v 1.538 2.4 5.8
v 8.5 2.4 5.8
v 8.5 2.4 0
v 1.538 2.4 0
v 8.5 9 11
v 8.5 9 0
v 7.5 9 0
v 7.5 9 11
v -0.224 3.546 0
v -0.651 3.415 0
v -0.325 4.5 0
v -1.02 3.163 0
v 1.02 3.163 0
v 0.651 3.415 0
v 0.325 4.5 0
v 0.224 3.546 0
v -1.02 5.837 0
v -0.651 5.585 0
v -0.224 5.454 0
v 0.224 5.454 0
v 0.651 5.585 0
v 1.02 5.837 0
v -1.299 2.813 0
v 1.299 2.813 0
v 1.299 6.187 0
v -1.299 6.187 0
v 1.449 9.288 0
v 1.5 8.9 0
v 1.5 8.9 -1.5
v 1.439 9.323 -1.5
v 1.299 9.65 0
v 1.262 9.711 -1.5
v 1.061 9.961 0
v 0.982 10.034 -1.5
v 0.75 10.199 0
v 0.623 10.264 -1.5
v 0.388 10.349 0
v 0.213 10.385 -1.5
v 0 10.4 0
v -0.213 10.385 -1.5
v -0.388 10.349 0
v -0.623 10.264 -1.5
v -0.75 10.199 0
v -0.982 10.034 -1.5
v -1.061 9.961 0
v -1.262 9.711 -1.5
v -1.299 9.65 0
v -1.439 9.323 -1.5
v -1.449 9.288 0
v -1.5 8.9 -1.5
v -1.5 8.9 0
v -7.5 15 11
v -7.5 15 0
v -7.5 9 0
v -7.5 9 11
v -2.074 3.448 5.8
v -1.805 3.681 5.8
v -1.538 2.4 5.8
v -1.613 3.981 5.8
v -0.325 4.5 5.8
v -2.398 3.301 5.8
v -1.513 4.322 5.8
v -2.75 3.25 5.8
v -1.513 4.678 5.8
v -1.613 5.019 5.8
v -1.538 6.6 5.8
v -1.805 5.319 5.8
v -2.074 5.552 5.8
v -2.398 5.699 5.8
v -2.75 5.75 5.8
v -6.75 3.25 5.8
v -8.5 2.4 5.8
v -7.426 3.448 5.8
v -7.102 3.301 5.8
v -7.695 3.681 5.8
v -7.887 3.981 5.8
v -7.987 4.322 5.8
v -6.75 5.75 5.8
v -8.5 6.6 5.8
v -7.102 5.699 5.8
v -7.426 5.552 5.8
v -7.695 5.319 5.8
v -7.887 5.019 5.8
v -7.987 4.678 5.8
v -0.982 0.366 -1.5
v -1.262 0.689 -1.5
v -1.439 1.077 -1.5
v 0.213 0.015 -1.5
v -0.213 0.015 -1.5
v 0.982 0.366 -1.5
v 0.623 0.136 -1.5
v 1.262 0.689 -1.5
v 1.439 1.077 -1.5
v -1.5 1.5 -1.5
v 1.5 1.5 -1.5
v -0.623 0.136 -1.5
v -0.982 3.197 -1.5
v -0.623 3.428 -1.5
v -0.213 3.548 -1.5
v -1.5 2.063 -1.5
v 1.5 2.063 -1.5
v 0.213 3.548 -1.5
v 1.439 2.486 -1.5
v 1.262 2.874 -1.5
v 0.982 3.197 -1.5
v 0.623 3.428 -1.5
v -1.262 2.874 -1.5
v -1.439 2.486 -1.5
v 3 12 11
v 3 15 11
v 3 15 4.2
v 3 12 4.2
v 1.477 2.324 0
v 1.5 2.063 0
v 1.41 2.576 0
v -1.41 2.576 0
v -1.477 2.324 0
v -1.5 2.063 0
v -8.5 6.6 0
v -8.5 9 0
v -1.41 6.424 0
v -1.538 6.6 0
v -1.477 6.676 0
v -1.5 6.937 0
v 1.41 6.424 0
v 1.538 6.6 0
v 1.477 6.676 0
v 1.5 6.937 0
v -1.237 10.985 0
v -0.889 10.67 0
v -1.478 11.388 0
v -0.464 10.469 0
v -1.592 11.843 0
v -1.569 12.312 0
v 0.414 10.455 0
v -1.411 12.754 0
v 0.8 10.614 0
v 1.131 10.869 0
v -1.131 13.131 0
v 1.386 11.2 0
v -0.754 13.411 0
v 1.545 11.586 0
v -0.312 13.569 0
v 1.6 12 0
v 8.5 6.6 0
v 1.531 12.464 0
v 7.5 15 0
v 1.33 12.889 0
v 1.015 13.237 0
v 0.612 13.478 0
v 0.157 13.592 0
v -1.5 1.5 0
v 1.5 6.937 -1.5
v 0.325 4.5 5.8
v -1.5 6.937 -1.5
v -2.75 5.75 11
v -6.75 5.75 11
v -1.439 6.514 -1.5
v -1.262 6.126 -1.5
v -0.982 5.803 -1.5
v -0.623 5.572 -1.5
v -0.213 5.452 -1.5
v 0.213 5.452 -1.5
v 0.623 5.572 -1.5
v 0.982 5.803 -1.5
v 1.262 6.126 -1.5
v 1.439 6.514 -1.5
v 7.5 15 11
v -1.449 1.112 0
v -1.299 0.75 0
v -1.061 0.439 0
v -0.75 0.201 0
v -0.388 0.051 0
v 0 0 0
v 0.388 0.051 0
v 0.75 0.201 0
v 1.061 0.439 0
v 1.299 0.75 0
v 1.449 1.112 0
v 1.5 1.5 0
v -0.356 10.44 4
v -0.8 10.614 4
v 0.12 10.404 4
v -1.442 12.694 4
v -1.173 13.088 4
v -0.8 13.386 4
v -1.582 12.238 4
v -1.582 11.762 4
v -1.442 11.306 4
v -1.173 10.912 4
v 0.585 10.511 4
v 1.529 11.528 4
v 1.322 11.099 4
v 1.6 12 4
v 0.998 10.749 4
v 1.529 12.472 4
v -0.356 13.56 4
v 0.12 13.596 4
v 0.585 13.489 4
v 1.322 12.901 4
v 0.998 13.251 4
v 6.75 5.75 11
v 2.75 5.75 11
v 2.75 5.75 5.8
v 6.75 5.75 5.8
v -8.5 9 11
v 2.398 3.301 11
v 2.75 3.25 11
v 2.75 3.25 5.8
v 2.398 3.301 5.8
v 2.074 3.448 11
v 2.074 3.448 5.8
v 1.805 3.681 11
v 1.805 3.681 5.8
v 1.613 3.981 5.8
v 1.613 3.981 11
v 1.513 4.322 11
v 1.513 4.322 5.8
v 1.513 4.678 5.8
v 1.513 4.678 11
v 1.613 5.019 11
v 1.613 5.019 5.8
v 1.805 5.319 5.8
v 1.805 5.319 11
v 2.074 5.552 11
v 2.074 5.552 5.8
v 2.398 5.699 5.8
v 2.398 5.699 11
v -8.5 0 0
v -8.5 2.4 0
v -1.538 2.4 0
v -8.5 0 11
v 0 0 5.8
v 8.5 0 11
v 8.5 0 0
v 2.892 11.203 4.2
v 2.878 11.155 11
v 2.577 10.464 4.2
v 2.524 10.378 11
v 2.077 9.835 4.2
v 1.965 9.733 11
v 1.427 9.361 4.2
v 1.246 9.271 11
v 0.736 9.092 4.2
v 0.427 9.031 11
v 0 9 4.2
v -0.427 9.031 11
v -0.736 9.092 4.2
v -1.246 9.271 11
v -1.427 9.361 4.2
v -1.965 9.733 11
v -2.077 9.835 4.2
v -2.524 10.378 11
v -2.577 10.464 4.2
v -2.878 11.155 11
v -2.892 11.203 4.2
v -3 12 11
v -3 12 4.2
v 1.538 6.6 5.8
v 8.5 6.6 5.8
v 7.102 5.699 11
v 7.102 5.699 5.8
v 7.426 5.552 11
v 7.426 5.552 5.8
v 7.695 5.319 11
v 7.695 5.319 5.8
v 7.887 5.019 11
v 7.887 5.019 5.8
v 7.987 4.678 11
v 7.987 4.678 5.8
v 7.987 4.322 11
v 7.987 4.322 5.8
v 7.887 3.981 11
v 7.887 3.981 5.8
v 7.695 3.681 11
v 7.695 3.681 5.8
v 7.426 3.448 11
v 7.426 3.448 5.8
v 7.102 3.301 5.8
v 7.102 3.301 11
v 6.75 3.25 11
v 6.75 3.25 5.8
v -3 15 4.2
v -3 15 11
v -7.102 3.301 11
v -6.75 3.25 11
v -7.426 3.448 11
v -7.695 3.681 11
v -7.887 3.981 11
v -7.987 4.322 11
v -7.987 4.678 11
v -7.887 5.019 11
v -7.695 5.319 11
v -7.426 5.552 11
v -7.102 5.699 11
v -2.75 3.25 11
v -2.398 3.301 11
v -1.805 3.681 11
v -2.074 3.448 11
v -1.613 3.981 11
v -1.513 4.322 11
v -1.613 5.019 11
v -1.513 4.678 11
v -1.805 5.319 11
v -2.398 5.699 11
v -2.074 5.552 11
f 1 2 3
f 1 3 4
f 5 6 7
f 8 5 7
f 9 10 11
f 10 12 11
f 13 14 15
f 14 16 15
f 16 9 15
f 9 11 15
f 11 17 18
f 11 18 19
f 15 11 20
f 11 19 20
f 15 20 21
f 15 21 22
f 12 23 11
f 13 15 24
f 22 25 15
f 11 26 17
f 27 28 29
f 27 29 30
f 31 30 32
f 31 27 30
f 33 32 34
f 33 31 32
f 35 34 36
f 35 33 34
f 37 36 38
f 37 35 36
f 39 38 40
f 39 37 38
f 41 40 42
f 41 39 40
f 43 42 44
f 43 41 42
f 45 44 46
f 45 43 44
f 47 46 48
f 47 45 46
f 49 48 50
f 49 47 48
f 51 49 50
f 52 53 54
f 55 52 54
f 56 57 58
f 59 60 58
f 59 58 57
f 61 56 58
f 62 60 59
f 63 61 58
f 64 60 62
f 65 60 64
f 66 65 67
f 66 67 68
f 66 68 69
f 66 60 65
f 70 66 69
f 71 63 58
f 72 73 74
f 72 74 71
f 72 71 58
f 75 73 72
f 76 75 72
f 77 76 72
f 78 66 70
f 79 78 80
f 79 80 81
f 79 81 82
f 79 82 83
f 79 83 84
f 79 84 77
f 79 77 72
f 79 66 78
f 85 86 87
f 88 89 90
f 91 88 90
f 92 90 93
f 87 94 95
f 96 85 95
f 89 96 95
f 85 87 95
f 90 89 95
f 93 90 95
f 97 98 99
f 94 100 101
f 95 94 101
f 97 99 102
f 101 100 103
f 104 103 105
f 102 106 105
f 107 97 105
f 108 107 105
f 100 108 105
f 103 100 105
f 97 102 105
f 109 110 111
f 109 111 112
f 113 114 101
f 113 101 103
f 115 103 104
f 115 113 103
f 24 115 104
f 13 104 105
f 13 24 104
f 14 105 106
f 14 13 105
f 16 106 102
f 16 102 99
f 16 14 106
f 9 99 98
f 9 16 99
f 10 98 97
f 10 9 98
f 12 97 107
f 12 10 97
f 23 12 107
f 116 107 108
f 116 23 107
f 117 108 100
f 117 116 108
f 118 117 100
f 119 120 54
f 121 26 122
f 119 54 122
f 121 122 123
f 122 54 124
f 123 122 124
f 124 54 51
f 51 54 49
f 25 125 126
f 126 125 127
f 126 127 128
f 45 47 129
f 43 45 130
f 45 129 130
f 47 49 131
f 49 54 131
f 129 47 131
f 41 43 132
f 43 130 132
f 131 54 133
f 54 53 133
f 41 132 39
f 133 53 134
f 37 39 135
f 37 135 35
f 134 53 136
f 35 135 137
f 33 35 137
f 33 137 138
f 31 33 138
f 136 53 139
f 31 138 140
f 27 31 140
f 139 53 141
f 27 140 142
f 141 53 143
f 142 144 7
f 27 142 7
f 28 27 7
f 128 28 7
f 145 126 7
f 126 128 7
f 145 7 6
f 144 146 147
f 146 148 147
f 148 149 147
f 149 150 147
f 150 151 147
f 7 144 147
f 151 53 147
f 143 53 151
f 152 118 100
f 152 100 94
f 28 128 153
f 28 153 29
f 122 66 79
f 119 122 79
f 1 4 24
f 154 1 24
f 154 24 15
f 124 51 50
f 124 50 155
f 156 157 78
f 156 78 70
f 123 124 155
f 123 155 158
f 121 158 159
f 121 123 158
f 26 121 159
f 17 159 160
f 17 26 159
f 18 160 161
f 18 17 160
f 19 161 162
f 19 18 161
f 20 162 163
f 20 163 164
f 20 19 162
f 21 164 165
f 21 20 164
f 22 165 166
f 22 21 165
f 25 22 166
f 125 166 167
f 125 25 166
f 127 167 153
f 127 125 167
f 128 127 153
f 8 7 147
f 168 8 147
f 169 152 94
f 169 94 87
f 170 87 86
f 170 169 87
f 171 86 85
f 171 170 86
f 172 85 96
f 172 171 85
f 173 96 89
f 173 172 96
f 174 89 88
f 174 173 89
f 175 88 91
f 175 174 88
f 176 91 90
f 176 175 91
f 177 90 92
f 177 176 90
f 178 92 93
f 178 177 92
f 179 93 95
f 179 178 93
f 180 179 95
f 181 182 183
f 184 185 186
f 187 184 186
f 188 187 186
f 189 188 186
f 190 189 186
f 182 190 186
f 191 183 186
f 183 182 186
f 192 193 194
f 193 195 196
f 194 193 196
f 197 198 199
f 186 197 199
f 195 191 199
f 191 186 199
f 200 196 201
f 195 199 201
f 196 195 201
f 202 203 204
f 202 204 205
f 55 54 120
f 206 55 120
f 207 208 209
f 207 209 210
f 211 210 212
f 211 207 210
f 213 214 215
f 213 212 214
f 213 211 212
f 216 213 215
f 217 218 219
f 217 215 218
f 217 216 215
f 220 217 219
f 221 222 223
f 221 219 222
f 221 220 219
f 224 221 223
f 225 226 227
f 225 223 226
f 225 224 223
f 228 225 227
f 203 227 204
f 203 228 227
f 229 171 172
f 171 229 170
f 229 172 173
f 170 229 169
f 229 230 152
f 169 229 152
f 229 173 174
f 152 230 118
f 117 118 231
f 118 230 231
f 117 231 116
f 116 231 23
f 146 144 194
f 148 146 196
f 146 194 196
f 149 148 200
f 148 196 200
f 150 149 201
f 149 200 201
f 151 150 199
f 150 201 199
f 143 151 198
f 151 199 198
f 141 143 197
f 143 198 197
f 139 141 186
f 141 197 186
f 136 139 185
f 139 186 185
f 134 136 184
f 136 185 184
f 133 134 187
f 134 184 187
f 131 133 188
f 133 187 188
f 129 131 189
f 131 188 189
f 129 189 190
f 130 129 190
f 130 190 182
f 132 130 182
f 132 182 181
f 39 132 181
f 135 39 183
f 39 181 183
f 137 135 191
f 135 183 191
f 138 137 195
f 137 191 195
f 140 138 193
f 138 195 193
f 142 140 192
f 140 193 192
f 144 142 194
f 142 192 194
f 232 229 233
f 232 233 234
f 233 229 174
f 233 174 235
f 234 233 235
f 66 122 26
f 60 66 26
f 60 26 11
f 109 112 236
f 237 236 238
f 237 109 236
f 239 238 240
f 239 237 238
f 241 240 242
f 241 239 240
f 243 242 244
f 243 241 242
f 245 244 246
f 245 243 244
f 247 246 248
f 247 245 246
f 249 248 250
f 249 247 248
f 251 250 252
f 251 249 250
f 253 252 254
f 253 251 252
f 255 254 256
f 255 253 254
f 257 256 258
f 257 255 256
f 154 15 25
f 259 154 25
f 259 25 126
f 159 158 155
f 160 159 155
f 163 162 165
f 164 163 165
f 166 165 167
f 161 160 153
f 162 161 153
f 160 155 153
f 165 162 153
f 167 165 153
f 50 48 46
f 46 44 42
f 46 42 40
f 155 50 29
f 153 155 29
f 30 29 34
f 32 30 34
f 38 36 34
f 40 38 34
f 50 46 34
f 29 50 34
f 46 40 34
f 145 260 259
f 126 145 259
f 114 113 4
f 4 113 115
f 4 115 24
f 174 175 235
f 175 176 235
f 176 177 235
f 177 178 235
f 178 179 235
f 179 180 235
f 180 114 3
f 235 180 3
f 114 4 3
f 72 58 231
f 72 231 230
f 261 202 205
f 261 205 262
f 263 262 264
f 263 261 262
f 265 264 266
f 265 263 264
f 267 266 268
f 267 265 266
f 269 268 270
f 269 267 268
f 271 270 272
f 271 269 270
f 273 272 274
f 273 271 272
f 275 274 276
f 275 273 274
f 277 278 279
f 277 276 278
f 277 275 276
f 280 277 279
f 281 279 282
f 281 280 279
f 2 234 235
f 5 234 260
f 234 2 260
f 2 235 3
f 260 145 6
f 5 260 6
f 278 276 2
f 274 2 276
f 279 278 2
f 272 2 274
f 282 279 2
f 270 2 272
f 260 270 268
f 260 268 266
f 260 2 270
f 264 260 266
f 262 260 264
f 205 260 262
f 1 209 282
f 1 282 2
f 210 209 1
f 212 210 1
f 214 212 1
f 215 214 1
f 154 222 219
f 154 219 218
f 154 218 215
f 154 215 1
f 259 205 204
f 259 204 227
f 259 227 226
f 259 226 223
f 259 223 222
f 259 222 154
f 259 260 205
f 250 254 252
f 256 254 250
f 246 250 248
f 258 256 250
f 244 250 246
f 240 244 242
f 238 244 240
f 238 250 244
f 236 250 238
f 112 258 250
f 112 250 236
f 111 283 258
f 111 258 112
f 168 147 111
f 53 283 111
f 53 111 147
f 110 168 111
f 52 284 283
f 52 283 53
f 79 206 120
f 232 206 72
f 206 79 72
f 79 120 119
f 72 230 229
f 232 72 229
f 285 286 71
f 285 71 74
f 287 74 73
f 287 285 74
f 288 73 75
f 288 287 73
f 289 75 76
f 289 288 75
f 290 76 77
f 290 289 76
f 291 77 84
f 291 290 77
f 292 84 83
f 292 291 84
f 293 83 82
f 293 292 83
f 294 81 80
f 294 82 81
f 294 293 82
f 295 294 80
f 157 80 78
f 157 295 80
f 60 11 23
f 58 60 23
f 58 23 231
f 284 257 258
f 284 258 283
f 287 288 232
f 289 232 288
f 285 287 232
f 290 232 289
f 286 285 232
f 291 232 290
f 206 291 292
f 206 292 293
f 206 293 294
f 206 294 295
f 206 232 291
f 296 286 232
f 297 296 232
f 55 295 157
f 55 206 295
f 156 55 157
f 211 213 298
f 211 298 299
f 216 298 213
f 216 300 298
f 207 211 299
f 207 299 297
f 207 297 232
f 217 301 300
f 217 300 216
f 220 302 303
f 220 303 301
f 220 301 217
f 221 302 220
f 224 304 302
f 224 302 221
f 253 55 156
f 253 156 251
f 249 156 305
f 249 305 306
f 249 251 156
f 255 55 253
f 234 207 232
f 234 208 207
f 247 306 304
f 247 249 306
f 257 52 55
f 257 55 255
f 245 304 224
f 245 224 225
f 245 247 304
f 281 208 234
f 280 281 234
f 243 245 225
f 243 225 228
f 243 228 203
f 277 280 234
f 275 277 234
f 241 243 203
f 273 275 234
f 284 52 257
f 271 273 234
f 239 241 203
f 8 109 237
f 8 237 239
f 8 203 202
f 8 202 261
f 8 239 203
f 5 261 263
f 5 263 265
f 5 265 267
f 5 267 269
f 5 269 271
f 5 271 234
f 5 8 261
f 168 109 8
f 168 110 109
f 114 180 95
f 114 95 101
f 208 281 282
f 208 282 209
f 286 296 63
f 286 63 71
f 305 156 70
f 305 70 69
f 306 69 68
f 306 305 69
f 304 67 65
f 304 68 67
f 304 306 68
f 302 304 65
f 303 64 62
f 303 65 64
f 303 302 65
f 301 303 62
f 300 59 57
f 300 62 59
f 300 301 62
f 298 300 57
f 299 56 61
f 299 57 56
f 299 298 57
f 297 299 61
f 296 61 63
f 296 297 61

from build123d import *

# Parameters (mm, degrees)
BOSS_EXTRUDE1_DEPTH = 11
CUT_EXTRUDE1_DEPTH  = 7
SKETCH4_R           = 1.6
CUT_EXTRUDE2_DEPTH  = 19.607794066
SKETCH5_R           = 1.25
CUT_EXTRUDE3_DEPTH  = 21.451161336
CUT_EXTRUDE4_DEPTH  = 21.451161336
CUT_EXTRUDE5_DEPTH  = 5.8
SKETCH9_W           = 6.962435565
SKETCH9_H           = 4.2
CUT_EXTRUDE6_DEPTH  = 5.8
BOSS_EXTRUDE3_START = 0.2
BOSS_EXTRUDE3_DEPTH = 0.2
BOSS_EXTRUDE4_DEPTH = 7.3
CUT_EXTRUDE7_DEPTH  = 1.6


with BuildPart() as part:
    # Sketch1 → Boss-Extrude1 (new body)
    with BuildSketch(Plane.XY):
        Polygon((-8.5, 0), (8.5, 0), (8.5, 9), (7.5, 9), (7.5, 15), (-7.5, 15), (-7.5, 9), (-8.5, 9), align=None)
    extrude(amount=BOSS_EXTRUDE1_DEPTH)

    # Sketch2 → Cut-Extrude1 (cut)
    with BuildSketch(Plane.XY.offset(11)):
        with BuildLine():
            Line((3, 18), (3, 12))
            ThreePointArc((3, 12), (0, 9), (-3, 12))
            Line((-3, 12), (-3, 18))
            ThreePointArc((-3, 18), (0, 21), (3, 18))
        make_face()
    extrude(amount=-CUT_EXTRUDE1_DEPTH, mode=Mode.SUBTRACT)

    # Sketch4 → Cut-Extrude2 (cut, through all)
    with BuildSketch(Plane.XY.offset(4)):
        with Locations((0, 12)):
            Circle(SKETCH4_R)
    extrude(amount=-CUT_EXTRUDE2_DEPTH, mode=Mode.SUBTRACT)

    # Sketch5 → Cut-Extrude3 (cut, through all)
    with BuildSketch(Plane.XY.offset(11)):
        with Locations((-4.75, 4.5)):
            Circle(SKETCH5_R)
        with Locations(Location((4.75, 4.5, 0), (0, 0, 180))):
            Circle(SKETCH5_R)
    extrude(amount=-CUT_EXTRUDE3_DEPTH, mode=Mode.SUBTRACT)

    # Sketch7 → Cut-Extrude4 (cut, through all)
    with BuildSketch(Plane.XY.offset(11)):
        with BuildLine():
            Line((-6.75, 5.75), (-2.75, 5.75))
            ThreePointArc((-2.75, 5.75), (-1.5, 4.5), (-2.75, 3.25))
            Line((-2.75, 3.25), (-6.75, 3.25))
            ThreePointArc((-6.75, 3.25), (-8, 4.5), (-6.75, 5.75))
        make_face()
        with BuildLine():
            Line((6.75, 3.25), (2.75, 3.25))
            ThreePointArc((2.75, 3.25), (1.5, 4.5), (2.75, 5.75))
            Line((2.75, 5.75), (6.75, 5.75))
            ThreePointArc((6.75, 5.75), (8, 4.5), (6.75, 3.25))
        make_face()
    extrude(amount=-CUT_EXTRUDE4_DEPTH, mode=Mode.SUBTRACT)

    # Sketch8 → Cut-Extrude5 (cut)
    with BuildSketch(Plane(origin=(0, 0, 0), x_dir=(-1, 0, 0), z_dir=(0, 0, -1))):
        Polygon((-1.537564435, 6.6), (-3.962435565, 6.6), (-5.174871131, 4.5), (-3.962435565, 2.4), (-1.537564435, 2.4), (-0.325128869, 4.5), align=None)
        Polygon((1.537564435, 6.6), (0.325128869, 4.5), (1.537564435, 2.4), (3.962435565, 2.4), (5.174871131, 4.5), (3.962435565, 6.6), align=None)
    extrude(amount=-CUT_EXTRUDE5_DEPTH, mode=Mode.SUBTRACT)

    # Sketch9 → Cut-Extrude6 (cut)
    with BuildSketch(Plane(origin=(0, 0, 5.8), x_dir=(-1, 0, 0), z_dir=(0, 0, -1))):
        with Locations((5.018782218, 4.5)):
            Rectangle(SKETCH9_W, SKETCH9_H)
        with Locations((-5.018782218, 4.5)):
            Rectangle(SKETCH9_W, SKETCH9_H)
    extrude(amount=CUT_EXTRUDE6_DEPTH, mode=Mode.SUBTRACT)

    # Sketch11 → Boss-Extrude3 (add)
    with BuildSketch(Plane.XY.offset(4).offset(BOSS_EXTRUDE3_START)):
        with BuildLine():
            Line((3, 15), (-3, 15))
            Line((-3, 15), (-3, 12))
            ThreePointArc((-3, 12), (0, 9), (3, 12))
            Line((3, 12), (3, 15))
        make_face()
    extrude(amount=-BOSS_EXTRUDE3_DEPTH)

    # Sketch12 → Boss-Extrude4 (add)
    with BuildSketch(Plane(origin=(0, 0, 5.8), x_dir=(-1, 0, 0), z_dir=(0, 0, -1))):
        with BuildLine():
            Line((1.5, 8.9), (1.5, 6.936860279))
            ThreePointArc((1.5, 6.936860279), (0, 5.436860279), (-1.5, 6.936860279))
            Line((-1.5, 6.936860279), (-1.5, 8.9))
            ThreePointArc((-1.5, 8.9), (0, 10.4), (1.5, 8.9))
        make_face()
        with BuildLine():
            Line((1.5, 2.063139721), (1.5, 1.5))
            ThreePointArc((1.5, 1.5), (0, 0), (-1.5, 1.5))
            Line((-1.5, 1.5), (-1.5, 2.063139721))
            ThreePointArc((-1.5, 2.063139721), (0, 3.563139721), (1.5, 2.063139721))
        make_face()
    extrude(amount=BOSS_EXTRUDE4_DEPTH)

    # Sketch13 → Cut-Extrude7 (cut)
    with BuildSketch(Plane.XY.offset(5.8)):
        with BuildLine():
            ThreePointArc((1.42730909, 9.361290323), (0, 10.4), (-1.42730909, 9.361290323))
            ThreePointArc((-1.42730909, 9.361290323), (0, 9), (1.42730909, 9.361290323))
        make_face()
    extrude(amount=-CUT_EXTRUDE7_DEPTH, mode=Mode.SUBTRACT)


solid = part.part
